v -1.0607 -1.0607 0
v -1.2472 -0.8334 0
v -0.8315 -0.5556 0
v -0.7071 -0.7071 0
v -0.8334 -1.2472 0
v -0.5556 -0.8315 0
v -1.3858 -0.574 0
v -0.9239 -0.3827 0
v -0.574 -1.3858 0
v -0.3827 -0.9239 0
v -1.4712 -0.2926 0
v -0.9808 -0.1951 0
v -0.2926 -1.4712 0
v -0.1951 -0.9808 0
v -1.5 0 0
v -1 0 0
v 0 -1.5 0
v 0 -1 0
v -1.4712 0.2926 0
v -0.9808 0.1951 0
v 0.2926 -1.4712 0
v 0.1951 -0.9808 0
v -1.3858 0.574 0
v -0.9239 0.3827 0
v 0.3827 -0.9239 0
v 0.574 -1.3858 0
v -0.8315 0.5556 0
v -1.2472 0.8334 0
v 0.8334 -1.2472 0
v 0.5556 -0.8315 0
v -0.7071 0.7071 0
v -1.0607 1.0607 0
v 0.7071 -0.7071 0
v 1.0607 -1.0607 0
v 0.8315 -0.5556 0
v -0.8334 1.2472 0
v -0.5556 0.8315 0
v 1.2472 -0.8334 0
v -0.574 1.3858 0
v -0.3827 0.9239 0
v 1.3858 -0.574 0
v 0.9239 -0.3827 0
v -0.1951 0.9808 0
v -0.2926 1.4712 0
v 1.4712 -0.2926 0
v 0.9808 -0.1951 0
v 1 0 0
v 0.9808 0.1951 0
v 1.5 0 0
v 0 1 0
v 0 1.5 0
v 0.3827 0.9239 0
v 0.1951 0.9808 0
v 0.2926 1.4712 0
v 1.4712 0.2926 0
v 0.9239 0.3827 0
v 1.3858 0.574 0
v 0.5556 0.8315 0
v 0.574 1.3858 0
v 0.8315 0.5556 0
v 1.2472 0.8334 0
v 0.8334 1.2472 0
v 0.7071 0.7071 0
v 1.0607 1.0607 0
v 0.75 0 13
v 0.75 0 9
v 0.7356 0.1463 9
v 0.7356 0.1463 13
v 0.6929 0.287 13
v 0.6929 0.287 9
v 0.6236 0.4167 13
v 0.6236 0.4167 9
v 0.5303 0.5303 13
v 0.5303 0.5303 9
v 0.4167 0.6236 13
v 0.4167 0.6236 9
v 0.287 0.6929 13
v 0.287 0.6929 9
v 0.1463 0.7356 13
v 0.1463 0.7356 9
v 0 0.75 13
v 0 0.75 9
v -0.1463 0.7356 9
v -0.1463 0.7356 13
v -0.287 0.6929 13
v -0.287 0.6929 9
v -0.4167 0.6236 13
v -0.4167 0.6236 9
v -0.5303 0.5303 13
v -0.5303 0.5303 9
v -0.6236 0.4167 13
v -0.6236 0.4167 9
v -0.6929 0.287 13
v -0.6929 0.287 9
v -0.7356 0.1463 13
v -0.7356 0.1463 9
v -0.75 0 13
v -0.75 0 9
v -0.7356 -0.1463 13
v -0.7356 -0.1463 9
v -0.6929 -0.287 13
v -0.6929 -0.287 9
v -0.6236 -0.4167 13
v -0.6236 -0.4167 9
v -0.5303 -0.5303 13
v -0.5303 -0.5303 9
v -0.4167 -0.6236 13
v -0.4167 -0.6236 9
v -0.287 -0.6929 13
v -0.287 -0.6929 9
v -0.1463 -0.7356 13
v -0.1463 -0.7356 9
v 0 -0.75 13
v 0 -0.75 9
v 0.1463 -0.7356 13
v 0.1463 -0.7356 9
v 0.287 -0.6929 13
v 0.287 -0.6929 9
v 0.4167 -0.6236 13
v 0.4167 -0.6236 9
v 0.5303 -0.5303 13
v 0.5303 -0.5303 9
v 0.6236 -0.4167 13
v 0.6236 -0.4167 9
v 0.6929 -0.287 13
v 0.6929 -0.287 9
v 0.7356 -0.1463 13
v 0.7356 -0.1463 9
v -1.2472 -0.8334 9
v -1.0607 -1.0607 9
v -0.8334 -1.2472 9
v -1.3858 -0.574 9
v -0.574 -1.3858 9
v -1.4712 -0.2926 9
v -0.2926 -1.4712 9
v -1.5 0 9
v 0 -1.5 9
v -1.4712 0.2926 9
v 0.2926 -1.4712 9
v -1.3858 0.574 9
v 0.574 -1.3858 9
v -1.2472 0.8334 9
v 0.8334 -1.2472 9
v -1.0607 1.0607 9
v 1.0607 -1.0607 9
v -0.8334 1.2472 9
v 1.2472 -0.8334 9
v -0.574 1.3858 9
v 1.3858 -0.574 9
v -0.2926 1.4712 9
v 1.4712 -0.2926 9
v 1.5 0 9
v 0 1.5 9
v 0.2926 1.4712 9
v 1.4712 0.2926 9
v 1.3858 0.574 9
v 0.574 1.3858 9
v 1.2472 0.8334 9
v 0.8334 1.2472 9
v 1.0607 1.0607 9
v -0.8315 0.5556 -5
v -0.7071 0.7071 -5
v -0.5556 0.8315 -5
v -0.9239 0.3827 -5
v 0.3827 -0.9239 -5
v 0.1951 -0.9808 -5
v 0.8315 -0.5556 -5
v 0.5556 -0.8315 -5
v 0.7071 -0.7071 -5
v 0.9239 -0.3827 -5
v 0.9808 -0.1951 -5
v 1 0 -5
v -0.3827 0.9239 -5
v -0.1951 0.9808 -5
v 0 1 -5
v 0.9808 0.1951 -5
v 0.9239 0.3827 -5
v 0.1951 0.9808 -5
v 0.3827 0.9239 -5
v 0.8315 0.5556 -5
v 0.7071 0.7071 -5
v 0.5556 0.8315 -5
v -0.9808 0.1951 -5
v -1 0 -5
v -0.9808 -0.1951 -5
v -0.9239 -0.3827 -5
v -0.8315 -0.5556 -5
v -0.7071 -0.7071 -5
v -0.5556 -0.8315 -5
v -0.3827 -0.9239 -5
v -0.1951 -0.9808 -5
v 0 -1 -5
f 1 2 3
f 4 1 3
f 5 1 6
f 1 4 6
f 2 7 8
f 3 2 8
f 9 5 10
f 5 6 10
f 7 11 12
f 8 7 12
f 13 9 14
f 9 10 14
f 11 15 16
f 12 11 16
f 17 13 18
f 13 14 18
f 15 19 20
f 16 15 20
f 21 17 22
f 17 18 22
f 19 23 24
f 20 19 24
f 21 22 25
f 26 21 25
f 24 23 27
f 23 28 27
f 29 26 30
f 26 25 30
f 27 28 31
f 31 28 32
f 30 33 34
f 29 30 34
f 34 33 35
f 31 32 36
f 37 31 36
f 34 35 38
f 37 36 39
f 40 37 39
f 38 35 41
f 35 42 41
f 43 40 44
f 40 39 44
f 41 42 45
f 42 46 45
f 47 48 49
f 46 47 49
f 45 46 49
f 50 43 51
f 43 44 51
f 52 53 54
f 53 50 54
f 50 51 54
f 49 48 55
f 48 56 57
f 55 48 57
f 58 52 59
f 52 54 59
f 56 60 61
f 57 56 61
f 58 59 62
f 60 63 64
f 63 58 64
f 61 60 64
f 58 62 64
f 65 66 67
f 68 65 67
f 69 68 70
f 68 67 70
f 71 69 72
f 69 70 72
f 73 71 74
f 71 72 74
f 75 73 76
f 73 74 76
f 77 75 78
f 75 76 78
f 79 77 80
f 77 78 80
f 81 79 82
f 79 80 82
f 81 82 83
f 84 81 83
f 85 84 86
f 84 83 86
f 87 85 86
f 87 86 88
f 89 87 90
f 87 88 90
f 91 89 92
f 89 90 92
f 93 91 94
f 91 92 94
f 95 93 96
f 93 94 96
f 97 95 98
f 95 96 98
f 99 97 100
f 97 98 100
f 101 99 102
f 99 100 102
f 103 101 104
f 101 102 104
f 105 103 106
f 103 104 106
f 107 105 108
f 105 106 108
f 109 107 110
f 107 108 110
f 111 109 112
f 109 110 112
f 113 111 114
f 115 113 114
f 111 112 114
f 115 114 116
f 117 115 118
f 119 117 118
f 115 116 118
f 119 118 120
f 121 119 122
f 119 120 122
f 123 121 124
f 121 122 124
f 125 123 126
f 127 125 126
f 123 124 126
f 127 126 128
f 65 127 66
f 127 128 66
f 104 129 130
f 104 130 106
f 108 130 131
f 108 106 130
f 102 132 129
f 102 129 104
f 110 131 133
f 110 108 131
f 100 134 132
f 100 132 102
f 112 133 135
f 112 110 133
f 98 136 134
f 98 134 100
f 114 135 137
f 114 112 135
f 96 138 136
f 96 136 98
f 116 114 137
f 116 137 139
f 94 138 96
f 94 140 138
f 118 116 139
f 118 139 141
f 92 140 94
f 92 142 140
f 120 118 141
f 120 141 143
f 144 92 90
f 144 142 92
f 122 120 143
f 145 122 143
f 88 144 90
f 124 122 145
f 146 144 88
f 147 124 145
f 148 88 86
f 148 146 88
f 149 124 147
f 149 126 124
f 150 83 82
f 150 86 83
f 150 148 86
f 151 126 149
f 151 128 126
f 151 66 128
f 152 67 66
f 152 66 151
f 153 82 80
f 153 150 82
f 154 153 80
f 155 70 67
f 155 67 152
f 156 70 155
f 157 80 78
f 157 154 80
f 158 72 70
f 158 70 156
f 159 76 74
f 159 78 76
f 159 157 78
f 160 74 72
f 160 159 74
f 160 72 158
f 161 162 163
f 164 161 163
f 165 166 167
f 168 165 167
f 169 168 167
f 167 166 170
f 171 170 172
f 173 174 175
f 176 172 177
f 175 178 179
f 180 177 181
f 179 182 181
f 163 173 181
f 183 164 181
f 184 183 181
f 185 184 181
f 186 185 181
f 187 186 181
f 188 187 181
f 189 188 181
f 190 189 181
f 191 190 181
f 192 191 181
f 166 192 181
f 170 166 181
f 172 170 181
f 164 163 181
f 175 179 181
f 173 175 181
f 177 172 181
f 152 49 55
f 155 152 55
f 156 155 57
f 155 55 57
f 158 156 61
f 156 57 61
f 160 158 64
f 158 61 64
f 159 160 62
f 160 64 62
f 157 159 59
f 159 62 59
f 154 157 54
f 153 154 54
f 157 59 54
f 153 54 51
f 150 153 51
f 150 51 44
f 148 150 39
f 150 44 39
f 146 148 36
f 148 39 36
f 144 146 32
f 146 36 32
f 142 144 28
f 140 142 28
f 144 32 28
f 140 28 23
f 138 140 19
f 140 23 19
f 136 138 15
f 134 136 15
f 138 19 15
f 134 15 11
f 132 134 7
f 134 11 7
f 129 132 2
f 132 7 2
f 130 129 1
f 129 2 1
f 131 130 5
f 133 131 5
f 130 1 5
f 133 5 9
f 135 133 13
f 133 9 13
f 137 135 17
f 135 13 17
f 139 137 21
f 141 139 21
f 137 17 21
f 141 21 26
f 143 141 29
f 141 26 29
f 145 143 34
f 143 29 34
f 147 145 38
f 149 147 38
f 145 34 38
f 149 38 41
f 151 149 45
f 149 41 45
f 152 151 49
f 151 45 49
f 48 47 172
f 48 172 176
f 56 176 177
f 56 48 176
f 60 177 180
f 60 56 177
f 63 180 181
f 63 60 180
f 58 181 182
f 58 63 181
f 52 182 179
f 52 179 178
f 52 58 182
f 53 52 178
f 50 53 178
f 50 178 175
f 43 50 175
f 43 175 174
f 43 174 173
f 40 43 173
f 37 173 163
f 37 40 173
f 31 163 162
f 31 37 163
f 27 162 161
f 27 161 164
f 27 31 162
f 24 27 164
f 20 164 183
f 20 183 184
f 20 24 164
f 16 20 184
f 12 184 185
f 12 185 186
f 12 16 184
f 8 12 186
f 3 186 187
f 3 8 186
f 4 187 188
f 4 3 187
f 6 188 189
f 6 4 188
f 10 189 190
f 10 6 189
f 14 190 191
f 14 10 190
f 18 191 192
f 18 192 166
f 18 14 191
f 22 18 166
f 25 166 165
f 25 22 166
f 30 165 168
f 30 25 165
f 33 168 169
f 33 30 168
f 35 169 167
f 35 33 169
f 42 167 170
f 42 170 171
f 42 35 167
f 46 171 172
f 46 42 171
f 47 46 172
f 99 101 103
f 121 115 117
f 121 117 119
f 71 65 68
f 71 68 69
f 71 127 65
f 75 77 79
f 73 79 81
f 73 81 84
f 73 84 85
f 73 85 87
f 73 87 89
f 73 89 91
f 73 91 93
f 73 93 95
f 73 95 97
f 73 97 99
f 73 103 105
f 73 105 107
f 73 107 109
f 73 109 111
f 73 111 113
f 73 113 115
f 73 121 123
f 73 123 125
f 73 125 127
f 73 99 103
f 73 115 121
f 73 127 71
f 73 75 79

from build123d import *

# Parameters (mm, degrees)
F0_R     = 1.5
F1_DEPTH = 9
F2_R     = 0.75
F3_DEPTH = 4
F4_R     = 1
F5_DEPTH = 5


with BuildPart() as f1:
    # F0 (on Top) → F1 (new body)
    with BuildSketch(Plane.XY):
        Circle(F0_R)
    extrude(amount=F1_DEPTH)

    # F2 (on face) → F3 (join)
    with BuildSketch(Plane.XY.offset(9)):
        Circle(F2_R)
    extrude(amount=F3_DEPTH)

    # F4 (on Top) → F5 (join)
    with BuildSketch(Plane.XY):
        Circle(F4_R)
    extrude(amount=-F5_DEPTH)


solid = f1.part
